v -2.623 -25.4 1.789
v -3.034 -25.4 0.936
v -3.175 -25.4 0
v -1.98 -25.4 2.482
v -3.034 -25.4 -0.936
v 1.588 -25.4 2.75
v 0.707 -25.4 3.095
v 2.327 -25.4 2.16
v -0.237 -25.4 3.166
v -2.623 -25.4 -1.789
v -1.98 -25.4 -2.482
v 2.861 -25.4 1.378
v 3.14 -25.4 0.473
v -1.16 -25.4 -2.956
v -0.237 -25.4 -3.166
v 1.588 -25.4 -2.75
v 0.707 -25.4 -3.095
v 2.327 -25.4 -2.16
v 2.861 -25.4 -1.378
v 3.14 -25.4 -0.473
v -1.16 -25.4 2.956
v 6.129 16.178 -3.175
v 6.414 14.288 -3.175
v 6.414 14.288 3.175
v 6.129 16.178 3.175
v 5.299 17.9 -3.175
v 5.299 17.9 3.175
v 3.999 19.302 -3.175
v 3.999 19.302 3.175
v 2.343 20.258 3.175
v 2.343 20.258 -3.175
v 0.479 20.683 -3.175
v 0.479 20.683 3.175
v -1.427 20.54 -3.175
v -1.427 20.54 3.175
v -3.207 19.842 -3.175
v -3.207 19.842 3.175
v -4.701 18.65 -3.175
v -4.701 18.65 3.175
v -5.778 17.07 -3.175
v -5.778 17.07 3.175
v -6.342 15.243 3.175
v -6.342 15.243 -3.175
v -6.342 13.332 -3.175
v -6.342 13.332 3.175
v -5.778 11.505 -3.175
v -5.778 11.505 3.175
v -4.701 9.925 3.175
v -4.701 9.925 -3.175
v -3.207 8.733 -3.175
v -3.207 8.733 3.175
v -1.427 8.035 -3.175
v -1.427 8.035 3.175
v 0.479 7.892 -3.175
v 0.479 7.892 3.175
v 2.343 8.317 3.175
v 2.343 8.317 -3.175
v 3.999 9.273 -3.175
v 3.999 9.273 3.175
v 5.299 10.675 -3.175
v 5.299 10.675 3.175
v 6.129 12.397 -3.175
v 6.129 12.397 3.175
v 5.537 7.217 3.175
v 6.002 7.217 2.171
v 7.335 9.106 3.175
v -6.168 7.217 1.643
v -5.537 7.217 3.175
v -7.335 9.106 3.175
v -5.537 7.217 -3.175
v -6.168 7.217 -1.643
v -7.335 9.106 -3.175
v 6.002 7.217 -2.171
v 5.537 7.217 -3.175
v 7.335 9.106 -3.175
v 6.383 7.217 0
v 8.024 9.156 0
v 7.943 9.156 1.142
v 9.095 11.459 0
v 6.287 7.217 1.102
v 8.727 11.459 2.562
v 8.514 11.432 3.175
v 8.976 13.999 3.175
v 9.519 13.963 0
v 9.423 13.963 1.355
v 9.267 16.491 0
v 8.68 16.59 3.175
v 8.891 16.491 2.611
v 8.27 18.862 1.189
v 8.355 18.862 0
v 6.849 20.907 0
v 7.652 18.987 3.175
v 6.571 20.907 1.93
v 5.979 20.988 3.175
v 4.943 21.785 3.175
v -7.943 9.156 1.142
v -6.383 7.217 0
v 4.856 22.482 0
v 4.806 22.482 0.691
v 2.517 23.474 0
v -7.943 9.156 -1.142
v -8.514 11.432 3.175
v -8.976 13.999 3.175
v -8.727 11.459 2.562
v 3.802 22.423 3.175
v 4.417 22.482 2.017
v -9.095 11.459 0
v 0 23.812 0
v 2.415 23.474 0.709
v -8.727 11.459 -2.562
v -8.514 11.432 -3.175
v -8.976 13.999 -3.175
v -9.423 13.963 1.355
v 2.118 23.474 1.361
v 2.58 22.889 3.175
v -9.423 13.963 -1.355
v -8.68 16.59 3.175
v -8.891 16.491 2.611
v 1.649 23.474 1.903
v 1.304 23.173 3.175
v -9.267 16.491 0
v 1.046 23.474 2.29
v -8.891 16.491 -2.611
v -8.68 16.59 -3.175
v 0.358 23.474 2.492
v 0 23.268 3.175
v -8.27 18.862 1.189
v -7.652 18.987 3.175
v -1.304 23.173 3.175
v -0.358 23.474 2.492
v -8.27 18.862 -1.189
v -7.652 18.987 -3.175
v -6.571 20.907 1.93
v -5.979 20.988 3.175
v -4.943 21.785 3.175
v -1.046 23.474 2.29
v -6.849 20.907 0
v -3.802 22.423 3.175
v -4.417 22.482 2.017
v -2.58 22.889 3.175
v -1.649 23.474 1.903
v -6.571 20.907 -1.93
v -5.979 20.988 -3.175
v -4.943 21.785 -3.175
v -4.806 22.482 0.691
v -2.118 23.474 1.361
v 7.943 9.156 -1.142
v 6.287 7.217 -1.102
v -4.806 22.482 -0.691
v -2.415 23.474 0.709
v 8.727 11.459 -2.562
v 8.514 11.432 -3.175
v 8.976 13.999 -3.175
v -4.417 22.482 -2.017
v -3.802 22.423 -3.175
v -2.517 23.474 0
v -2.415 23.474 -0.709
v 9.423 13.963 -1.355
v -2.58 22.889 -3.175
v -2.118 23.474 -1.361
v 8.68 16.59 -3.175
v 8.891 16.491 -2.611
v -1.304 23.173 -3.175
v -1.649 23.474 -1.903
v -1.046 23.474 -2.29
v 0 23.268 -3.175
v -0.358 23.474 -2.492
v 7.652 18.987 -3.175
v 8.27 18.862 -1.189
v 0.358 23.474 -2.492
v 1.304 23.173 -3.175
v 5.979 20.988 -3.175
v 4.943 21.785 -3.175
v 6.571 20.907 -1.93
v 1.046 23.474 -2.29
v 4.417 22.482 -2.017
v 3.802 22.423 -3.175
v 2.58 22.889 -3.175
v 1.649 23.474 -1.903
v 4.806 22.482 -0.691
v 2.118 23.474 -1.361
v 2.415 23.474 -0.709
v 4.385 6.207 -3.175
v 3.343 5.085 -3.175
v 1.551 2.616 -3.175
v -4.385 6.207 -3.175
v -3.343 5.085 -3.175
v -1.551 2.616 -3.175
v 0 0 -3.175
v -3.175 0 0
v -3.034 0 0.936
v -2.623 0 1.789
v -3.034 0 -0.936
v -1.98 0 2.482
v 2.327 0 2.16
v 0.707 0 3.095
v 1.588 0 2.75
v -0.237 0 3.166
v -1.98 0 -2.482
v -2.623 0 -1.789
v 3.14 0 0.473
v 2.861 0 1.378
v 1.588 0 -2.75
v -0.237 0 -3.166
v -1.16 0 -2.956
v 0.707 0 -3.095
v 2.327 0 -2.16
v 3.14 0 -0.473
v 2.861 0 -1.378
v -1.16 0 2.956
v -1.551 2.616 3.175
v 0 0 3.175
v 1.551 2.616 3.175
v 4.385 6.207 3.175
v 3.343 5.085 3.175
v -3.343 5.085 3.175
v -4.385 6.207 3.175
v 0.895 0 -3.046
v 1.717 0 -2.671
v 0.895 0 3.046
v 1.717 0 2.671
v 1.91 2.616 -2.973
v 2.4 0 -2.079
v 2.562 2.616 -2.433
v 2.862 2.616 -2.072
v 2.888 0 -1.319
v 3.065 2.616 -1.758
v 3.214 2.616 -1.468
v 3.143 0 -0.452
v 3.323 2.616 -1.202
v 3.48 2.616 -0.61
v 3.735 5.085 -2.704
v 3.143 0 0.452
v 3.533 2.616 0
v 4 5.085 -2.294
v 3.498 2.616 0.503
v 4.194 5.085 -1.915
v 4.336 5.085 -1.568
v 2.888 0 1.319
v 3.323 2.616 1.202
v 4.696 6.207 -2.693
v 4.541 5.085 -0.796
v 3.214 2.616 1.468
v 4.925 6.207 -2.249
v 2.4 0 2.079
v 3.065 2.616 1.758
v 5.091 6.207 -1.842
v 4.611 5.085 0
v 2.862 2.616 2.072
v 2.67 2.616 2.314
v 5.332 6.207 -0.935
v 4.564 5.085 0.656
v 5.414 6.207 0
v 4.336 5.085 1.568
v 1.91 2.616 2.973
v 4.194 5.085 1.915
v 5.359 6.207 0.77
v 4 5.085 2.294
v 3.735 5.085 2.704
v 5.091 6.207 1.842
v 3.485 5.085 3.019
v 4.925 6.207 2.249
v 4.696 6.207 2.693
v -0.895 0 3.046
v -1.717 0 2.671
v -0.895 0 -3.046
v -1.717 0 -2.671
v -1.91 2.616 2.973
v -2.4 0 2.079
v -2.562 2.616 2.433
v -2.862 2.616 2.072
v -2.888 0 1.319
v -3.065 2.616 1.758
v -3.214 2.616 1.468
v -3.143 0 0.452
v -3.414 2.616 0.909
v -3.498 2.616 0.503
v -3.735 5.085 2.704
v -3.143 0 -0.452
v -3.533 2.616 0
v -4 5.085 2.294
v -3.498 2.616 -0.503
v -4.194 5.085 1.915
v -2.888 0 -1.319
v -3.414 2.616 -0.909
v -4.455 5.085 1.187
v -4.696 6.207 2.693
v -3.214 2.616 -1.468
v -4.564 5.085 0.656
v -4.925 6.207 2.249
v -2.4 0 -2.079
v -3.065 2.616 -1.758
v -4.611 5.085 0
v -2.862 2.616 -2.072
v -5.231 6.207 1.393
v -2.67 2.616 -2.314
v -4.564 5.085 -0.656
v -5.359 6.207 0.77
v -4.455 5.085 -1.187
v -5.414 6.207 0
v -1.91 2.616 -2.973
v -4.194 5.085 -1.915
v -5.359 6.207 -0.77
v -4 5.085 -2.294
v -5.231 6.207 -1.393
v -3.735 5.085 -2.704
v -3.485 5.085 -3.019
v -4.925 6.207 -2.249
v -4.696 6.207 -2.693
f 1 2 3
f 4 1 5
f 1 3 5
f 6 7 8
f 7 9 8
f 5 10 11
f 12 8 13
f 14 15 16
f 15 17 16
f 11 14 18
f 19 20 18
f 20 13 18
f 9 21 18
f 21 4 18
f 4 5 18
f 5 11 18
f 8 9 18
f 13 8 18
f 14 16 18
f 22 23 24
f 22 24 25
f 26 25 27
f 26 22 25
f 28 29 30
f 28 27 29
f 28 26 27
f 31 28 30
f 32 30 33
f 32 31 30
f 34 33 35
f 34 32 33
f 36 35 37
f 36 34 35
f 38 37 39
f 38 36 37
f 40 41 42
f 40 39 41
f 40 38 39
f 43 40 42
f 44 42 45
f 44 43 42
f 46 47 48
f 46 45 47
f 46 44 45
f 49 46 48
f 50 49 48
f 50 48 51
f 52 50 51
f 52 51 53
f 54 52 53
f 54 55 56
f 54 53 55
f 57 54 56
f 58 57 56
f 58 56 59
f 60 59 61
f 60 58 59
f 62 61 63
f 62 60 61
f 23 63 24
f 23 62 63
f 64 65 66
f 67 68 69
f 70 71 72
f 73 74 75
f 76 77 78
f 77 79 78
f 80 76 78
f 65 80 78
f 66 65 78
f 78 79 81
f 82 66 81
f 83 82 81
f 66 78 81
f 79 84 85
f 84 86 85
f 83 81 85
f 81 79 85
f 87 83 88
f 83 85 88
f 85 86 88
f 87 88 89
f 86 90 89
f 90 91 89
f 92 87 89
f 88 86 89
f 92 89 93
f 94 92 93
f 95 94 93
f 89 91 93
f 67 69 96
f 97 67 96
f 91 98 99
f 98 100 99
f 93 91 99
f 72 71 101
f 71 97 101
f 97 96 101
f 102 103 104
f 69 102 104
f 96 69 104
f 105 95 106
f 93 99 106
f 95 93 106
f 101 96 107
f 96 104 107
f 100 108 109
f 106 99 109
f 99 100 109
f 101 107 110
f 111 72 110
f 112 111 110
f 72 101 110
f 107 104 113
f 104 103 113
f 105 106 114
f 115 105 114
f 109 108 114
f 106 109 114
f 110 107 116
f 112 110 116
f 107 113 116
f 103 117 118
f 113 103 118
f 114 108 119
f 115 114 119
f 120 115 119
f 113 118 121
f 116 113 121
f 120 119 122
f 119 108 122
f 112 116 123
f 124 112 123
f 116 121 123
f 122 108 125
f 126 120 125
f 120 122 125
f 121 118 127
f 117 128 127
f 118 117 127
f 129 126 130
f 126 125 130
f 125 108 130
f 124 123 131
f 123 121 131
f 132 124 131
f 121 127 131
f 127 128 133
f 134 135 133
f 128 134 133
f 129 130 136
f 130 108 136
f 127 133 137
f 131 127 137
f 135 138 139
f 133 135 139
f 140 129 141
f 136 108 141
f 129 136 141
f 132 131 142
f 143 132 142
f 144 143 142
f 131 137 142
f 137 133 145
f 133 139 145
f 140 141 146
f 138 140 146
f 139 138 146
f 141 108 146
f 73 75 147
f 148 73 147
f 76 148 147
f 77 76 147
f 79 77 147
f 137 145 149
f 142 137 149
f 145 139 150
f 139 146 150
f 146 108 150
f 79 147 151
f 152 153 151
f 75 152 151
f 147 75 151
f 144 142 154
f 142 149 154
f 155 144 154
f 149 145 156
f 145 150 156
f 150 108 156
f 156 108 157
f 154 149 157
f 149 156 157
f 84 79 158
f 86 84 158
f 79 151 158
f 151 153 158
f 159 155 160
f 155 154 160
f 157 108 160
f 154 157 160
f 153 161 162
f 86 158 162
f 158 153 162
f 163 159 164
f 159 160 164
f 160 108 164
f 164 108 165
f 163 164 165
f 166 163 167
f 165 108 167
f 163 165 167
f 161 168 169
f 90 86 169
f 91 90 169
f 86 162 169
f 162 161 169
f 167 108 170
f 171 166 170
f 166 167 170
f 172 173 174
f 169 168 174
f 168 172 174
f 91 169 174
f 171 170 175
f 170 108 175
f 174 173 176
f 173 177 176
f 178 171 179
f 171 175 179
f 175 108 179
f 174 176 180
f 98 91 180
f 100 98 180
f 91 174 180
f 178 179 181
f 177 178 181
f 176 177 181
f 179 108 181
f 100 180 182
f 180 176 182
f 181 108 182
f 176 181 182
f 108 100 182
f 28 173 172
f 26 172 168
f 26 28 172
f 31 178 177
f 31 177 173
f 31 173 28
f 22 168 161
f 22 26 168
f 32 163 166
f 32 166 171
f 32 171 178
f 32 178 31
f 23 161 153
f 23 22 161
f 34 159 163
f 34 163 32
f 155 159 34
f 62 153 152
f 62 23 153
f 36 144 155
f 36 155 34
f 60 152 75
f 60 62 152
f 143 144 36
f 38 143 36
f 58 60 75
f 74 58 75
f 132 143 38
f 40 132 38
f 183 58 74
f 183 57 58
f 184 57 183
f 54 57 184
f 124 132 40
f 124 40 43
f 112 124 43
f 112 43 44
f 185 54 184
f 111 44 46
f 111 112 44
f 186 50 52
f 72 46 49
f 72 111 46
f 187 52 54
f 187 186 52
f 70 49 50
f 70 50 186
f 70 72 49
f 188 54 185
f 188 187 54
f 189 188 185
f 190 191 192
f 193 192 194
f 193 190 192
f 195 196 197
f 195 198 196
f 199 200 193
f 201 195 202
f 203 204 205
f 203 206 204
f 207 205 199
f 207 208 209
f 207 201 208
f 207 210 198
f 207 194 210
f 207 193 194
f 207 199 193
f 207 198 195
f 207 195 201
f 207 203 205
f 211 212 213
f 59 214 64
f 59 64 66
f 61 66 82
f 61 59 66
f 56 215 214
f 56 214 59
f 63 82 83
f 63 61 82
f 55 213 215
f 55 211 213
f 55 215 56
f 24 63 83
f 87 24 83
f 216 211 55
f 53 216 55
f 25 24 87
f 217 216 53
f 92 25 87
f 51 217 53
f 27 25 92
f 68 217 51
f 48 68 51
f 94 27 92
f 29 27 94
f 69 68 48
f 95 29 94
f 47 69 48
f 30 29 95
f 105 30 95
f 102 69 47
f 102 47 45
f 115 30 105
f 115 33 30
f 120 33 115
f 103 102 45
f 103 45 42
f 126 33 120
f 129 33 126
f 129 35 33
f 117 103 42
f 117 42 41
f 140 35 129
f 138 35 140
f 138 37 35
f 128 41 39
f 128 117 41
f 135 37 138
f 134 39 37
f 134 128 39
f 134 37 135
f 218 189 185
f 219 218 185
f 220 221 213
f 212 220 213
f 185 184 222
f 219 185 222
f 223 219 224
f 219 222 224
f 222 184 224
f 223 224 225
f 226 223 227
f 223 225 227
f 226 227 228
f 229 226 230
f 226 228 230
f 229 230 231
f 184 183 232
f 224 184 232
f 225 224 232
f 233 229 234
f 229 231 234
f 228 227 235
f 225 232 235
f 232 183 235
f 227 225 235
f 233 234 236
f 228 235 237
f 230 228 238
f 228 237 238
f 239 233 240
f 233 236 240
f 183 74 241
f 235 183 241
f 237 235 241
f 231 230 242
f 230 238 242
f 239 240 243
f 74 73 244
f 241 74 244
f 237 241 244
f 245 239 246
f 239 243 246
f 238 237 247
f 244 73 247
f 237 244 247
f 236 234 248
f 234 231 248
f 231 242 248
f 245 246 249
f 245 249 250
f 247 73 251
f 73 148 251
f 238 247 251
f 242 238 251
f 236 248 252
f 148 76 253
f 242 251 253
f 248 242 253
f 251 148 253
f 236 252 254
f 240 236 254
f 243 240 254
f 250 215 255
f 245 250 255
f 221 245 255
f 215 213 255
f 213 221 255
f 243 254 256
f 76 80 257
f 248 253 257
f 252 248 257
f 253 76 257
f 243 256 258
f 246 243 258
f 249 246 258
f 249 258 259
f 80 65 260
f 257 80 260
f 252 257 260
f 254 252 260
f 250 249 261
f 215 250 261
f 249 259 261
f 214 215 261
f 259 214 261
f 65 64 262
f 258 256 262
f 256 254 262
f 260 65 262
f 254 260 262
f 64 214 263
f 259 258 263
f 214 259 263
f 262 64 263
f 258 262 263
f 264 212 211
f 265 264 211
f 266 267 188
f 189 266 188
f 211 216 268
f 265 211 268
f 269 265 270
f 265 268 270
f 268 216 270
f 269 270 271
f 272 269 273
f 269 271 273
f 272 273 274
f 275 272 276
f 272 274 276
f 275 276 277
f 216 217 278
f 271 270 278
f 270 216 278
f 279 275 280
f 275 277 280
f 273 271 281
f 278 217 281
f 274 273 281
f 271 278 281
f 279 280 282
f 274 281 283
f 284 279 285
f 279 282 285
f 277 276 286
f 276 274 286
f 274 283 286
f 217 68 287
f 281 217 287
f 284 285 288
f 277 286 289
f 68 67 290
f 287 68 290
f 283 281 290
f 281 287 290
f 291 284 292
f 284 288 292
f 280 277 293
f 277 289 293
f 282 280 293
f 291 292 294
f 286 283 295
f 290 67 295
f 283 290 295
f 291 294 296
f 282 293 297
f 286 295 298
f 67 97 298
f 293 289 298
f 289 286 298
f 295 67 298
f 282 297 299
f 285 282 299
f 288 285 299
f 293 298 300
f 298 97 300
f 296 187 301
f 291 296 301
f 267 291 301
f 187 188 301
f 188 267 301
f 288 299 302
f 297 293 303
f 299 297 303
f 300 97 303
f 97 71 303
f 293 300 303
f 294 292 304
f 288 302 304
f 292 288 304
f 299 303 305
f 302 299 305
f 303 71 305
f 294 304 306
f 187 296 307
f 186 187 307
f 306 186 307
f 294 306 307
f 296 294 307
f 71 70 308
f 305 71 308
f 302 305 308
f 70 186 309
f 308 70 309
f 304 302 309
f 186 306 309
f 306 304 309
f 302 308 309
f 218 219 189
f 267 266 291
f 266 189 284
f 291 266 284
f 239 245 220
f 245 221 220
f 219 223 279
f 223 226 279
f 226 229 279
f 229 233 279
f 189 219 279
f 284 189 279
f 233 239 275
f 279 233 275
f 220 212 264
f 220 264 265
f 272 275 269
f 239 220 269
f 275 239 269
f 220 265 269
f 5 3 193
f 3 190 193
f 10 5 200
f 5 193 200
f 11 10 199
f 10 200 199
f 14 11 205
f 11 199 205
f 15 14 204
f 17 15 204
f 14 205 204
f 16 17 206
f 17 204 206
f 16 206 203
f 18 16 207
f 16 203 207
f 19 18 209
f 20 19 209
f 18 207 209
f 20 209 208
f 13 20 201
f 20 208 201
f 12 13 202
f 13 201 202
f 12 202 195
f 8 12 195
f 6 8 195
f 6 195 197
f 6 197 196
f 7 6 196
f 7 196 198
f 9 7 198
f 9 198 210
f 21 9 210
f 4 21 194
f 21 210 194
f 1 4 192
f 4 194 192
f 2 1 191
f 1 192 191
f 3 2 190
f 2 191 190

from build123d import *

# Parameters (mm, degrees)
SKETCH14_W               = 3.175
SKETCH14_H               = 25.4
CUT_EXTRUDE10_DEPTH      = 29.750847814
CUT_EXTRUDE10_DEPTH_BACK = 29.750847814
CUT_EXTRUDE9_DEPTH       = 28.312382734
CUT_EXTRUDE9_DEPTH_BACK  = 28.312382734
SKETCH17_R               = 6.4135


with BuildPart() as part:
    # Sketch14 → Revolve4 (revolve)
    with BuildSketch(Plane.XY, mode=Mode.PRIVATE) as revolve4_sk:
        with Locations((1.5875, -12.7)):
            Rectangle(SKETCH14_W, SKETCH14_H)
    revolve(revolve4_sk.sketch.rotate(Axis((0, 0, 0), (0, -1, 0)), 180), axis=Axis((0, 0, 0), (0, -1, 0)))


with BuildPart() as body_2:
    # Sketch21 → Revolve5 (revolve)
    with BuildSketch(Plane.XY):
        with BuildLine():
            Line((0, 23.8125), (0, 0))
            Line((0, 0), (3.175, 0))
            ThreePointArc((3.175, 0), (4.01304802, 3.949061991), (6.382731959, 7.217396907))
            ThreePointArc((6.382731959, 7.217396907), (8.890116899, 17.70677573), (0, 23.8125))
        make_face()
    revolve(axis=Axis((0, 0, 0), (0, -1, 0)))

    # Sketch24 → Cut-Extrude10 (cut, two sides: drawn at the far end of the back side and taken through both)
    with BuildSketch(Plane(origin=(0, 0, 0), x_dir=(0, 0, -1), z_dir=(1, 0, 0)).offset(-CUT_EXTRUDE10_DEPTH_BACK)):
        Polygon((3.175, 14.2875), (3.175, 23.8125), (9.525, 23.8125), (9.525, 0), (3.175, 0), (3.175, 0.635), align=None)
        Polygon((-3.175, 0), (-9.525, 0), (-9.525, 23.8125), (-3.175, 23.8125), (-3.175, 14.2875), (-3.175, 0.635), align=None)
    extrude(amount=CUT_EXTRUDE10_DEPTH + CUT_EXTRUDE10_DEPTH_BACK, mode=Mode.SUBTRACT)

    # Sketch17 → Cut-Extrude9 (cut, two sides: drawn at the far end of the back side and taken through both)
    with BuildSketch(Plane.XY.offset(-CUT_EXTRUDE9_DEPTH_BACK)):
        with Locations((0, 14.2875)):
            Circle(SKETCH17_R)
    extrude(amount=CUT_EXTRUDE9_DEPTH + CUT_EXTRUDE9_DEPTH_BACK, mode=Mode.SUBTRACT)


solid = Compound([part.part, body_2.part])
